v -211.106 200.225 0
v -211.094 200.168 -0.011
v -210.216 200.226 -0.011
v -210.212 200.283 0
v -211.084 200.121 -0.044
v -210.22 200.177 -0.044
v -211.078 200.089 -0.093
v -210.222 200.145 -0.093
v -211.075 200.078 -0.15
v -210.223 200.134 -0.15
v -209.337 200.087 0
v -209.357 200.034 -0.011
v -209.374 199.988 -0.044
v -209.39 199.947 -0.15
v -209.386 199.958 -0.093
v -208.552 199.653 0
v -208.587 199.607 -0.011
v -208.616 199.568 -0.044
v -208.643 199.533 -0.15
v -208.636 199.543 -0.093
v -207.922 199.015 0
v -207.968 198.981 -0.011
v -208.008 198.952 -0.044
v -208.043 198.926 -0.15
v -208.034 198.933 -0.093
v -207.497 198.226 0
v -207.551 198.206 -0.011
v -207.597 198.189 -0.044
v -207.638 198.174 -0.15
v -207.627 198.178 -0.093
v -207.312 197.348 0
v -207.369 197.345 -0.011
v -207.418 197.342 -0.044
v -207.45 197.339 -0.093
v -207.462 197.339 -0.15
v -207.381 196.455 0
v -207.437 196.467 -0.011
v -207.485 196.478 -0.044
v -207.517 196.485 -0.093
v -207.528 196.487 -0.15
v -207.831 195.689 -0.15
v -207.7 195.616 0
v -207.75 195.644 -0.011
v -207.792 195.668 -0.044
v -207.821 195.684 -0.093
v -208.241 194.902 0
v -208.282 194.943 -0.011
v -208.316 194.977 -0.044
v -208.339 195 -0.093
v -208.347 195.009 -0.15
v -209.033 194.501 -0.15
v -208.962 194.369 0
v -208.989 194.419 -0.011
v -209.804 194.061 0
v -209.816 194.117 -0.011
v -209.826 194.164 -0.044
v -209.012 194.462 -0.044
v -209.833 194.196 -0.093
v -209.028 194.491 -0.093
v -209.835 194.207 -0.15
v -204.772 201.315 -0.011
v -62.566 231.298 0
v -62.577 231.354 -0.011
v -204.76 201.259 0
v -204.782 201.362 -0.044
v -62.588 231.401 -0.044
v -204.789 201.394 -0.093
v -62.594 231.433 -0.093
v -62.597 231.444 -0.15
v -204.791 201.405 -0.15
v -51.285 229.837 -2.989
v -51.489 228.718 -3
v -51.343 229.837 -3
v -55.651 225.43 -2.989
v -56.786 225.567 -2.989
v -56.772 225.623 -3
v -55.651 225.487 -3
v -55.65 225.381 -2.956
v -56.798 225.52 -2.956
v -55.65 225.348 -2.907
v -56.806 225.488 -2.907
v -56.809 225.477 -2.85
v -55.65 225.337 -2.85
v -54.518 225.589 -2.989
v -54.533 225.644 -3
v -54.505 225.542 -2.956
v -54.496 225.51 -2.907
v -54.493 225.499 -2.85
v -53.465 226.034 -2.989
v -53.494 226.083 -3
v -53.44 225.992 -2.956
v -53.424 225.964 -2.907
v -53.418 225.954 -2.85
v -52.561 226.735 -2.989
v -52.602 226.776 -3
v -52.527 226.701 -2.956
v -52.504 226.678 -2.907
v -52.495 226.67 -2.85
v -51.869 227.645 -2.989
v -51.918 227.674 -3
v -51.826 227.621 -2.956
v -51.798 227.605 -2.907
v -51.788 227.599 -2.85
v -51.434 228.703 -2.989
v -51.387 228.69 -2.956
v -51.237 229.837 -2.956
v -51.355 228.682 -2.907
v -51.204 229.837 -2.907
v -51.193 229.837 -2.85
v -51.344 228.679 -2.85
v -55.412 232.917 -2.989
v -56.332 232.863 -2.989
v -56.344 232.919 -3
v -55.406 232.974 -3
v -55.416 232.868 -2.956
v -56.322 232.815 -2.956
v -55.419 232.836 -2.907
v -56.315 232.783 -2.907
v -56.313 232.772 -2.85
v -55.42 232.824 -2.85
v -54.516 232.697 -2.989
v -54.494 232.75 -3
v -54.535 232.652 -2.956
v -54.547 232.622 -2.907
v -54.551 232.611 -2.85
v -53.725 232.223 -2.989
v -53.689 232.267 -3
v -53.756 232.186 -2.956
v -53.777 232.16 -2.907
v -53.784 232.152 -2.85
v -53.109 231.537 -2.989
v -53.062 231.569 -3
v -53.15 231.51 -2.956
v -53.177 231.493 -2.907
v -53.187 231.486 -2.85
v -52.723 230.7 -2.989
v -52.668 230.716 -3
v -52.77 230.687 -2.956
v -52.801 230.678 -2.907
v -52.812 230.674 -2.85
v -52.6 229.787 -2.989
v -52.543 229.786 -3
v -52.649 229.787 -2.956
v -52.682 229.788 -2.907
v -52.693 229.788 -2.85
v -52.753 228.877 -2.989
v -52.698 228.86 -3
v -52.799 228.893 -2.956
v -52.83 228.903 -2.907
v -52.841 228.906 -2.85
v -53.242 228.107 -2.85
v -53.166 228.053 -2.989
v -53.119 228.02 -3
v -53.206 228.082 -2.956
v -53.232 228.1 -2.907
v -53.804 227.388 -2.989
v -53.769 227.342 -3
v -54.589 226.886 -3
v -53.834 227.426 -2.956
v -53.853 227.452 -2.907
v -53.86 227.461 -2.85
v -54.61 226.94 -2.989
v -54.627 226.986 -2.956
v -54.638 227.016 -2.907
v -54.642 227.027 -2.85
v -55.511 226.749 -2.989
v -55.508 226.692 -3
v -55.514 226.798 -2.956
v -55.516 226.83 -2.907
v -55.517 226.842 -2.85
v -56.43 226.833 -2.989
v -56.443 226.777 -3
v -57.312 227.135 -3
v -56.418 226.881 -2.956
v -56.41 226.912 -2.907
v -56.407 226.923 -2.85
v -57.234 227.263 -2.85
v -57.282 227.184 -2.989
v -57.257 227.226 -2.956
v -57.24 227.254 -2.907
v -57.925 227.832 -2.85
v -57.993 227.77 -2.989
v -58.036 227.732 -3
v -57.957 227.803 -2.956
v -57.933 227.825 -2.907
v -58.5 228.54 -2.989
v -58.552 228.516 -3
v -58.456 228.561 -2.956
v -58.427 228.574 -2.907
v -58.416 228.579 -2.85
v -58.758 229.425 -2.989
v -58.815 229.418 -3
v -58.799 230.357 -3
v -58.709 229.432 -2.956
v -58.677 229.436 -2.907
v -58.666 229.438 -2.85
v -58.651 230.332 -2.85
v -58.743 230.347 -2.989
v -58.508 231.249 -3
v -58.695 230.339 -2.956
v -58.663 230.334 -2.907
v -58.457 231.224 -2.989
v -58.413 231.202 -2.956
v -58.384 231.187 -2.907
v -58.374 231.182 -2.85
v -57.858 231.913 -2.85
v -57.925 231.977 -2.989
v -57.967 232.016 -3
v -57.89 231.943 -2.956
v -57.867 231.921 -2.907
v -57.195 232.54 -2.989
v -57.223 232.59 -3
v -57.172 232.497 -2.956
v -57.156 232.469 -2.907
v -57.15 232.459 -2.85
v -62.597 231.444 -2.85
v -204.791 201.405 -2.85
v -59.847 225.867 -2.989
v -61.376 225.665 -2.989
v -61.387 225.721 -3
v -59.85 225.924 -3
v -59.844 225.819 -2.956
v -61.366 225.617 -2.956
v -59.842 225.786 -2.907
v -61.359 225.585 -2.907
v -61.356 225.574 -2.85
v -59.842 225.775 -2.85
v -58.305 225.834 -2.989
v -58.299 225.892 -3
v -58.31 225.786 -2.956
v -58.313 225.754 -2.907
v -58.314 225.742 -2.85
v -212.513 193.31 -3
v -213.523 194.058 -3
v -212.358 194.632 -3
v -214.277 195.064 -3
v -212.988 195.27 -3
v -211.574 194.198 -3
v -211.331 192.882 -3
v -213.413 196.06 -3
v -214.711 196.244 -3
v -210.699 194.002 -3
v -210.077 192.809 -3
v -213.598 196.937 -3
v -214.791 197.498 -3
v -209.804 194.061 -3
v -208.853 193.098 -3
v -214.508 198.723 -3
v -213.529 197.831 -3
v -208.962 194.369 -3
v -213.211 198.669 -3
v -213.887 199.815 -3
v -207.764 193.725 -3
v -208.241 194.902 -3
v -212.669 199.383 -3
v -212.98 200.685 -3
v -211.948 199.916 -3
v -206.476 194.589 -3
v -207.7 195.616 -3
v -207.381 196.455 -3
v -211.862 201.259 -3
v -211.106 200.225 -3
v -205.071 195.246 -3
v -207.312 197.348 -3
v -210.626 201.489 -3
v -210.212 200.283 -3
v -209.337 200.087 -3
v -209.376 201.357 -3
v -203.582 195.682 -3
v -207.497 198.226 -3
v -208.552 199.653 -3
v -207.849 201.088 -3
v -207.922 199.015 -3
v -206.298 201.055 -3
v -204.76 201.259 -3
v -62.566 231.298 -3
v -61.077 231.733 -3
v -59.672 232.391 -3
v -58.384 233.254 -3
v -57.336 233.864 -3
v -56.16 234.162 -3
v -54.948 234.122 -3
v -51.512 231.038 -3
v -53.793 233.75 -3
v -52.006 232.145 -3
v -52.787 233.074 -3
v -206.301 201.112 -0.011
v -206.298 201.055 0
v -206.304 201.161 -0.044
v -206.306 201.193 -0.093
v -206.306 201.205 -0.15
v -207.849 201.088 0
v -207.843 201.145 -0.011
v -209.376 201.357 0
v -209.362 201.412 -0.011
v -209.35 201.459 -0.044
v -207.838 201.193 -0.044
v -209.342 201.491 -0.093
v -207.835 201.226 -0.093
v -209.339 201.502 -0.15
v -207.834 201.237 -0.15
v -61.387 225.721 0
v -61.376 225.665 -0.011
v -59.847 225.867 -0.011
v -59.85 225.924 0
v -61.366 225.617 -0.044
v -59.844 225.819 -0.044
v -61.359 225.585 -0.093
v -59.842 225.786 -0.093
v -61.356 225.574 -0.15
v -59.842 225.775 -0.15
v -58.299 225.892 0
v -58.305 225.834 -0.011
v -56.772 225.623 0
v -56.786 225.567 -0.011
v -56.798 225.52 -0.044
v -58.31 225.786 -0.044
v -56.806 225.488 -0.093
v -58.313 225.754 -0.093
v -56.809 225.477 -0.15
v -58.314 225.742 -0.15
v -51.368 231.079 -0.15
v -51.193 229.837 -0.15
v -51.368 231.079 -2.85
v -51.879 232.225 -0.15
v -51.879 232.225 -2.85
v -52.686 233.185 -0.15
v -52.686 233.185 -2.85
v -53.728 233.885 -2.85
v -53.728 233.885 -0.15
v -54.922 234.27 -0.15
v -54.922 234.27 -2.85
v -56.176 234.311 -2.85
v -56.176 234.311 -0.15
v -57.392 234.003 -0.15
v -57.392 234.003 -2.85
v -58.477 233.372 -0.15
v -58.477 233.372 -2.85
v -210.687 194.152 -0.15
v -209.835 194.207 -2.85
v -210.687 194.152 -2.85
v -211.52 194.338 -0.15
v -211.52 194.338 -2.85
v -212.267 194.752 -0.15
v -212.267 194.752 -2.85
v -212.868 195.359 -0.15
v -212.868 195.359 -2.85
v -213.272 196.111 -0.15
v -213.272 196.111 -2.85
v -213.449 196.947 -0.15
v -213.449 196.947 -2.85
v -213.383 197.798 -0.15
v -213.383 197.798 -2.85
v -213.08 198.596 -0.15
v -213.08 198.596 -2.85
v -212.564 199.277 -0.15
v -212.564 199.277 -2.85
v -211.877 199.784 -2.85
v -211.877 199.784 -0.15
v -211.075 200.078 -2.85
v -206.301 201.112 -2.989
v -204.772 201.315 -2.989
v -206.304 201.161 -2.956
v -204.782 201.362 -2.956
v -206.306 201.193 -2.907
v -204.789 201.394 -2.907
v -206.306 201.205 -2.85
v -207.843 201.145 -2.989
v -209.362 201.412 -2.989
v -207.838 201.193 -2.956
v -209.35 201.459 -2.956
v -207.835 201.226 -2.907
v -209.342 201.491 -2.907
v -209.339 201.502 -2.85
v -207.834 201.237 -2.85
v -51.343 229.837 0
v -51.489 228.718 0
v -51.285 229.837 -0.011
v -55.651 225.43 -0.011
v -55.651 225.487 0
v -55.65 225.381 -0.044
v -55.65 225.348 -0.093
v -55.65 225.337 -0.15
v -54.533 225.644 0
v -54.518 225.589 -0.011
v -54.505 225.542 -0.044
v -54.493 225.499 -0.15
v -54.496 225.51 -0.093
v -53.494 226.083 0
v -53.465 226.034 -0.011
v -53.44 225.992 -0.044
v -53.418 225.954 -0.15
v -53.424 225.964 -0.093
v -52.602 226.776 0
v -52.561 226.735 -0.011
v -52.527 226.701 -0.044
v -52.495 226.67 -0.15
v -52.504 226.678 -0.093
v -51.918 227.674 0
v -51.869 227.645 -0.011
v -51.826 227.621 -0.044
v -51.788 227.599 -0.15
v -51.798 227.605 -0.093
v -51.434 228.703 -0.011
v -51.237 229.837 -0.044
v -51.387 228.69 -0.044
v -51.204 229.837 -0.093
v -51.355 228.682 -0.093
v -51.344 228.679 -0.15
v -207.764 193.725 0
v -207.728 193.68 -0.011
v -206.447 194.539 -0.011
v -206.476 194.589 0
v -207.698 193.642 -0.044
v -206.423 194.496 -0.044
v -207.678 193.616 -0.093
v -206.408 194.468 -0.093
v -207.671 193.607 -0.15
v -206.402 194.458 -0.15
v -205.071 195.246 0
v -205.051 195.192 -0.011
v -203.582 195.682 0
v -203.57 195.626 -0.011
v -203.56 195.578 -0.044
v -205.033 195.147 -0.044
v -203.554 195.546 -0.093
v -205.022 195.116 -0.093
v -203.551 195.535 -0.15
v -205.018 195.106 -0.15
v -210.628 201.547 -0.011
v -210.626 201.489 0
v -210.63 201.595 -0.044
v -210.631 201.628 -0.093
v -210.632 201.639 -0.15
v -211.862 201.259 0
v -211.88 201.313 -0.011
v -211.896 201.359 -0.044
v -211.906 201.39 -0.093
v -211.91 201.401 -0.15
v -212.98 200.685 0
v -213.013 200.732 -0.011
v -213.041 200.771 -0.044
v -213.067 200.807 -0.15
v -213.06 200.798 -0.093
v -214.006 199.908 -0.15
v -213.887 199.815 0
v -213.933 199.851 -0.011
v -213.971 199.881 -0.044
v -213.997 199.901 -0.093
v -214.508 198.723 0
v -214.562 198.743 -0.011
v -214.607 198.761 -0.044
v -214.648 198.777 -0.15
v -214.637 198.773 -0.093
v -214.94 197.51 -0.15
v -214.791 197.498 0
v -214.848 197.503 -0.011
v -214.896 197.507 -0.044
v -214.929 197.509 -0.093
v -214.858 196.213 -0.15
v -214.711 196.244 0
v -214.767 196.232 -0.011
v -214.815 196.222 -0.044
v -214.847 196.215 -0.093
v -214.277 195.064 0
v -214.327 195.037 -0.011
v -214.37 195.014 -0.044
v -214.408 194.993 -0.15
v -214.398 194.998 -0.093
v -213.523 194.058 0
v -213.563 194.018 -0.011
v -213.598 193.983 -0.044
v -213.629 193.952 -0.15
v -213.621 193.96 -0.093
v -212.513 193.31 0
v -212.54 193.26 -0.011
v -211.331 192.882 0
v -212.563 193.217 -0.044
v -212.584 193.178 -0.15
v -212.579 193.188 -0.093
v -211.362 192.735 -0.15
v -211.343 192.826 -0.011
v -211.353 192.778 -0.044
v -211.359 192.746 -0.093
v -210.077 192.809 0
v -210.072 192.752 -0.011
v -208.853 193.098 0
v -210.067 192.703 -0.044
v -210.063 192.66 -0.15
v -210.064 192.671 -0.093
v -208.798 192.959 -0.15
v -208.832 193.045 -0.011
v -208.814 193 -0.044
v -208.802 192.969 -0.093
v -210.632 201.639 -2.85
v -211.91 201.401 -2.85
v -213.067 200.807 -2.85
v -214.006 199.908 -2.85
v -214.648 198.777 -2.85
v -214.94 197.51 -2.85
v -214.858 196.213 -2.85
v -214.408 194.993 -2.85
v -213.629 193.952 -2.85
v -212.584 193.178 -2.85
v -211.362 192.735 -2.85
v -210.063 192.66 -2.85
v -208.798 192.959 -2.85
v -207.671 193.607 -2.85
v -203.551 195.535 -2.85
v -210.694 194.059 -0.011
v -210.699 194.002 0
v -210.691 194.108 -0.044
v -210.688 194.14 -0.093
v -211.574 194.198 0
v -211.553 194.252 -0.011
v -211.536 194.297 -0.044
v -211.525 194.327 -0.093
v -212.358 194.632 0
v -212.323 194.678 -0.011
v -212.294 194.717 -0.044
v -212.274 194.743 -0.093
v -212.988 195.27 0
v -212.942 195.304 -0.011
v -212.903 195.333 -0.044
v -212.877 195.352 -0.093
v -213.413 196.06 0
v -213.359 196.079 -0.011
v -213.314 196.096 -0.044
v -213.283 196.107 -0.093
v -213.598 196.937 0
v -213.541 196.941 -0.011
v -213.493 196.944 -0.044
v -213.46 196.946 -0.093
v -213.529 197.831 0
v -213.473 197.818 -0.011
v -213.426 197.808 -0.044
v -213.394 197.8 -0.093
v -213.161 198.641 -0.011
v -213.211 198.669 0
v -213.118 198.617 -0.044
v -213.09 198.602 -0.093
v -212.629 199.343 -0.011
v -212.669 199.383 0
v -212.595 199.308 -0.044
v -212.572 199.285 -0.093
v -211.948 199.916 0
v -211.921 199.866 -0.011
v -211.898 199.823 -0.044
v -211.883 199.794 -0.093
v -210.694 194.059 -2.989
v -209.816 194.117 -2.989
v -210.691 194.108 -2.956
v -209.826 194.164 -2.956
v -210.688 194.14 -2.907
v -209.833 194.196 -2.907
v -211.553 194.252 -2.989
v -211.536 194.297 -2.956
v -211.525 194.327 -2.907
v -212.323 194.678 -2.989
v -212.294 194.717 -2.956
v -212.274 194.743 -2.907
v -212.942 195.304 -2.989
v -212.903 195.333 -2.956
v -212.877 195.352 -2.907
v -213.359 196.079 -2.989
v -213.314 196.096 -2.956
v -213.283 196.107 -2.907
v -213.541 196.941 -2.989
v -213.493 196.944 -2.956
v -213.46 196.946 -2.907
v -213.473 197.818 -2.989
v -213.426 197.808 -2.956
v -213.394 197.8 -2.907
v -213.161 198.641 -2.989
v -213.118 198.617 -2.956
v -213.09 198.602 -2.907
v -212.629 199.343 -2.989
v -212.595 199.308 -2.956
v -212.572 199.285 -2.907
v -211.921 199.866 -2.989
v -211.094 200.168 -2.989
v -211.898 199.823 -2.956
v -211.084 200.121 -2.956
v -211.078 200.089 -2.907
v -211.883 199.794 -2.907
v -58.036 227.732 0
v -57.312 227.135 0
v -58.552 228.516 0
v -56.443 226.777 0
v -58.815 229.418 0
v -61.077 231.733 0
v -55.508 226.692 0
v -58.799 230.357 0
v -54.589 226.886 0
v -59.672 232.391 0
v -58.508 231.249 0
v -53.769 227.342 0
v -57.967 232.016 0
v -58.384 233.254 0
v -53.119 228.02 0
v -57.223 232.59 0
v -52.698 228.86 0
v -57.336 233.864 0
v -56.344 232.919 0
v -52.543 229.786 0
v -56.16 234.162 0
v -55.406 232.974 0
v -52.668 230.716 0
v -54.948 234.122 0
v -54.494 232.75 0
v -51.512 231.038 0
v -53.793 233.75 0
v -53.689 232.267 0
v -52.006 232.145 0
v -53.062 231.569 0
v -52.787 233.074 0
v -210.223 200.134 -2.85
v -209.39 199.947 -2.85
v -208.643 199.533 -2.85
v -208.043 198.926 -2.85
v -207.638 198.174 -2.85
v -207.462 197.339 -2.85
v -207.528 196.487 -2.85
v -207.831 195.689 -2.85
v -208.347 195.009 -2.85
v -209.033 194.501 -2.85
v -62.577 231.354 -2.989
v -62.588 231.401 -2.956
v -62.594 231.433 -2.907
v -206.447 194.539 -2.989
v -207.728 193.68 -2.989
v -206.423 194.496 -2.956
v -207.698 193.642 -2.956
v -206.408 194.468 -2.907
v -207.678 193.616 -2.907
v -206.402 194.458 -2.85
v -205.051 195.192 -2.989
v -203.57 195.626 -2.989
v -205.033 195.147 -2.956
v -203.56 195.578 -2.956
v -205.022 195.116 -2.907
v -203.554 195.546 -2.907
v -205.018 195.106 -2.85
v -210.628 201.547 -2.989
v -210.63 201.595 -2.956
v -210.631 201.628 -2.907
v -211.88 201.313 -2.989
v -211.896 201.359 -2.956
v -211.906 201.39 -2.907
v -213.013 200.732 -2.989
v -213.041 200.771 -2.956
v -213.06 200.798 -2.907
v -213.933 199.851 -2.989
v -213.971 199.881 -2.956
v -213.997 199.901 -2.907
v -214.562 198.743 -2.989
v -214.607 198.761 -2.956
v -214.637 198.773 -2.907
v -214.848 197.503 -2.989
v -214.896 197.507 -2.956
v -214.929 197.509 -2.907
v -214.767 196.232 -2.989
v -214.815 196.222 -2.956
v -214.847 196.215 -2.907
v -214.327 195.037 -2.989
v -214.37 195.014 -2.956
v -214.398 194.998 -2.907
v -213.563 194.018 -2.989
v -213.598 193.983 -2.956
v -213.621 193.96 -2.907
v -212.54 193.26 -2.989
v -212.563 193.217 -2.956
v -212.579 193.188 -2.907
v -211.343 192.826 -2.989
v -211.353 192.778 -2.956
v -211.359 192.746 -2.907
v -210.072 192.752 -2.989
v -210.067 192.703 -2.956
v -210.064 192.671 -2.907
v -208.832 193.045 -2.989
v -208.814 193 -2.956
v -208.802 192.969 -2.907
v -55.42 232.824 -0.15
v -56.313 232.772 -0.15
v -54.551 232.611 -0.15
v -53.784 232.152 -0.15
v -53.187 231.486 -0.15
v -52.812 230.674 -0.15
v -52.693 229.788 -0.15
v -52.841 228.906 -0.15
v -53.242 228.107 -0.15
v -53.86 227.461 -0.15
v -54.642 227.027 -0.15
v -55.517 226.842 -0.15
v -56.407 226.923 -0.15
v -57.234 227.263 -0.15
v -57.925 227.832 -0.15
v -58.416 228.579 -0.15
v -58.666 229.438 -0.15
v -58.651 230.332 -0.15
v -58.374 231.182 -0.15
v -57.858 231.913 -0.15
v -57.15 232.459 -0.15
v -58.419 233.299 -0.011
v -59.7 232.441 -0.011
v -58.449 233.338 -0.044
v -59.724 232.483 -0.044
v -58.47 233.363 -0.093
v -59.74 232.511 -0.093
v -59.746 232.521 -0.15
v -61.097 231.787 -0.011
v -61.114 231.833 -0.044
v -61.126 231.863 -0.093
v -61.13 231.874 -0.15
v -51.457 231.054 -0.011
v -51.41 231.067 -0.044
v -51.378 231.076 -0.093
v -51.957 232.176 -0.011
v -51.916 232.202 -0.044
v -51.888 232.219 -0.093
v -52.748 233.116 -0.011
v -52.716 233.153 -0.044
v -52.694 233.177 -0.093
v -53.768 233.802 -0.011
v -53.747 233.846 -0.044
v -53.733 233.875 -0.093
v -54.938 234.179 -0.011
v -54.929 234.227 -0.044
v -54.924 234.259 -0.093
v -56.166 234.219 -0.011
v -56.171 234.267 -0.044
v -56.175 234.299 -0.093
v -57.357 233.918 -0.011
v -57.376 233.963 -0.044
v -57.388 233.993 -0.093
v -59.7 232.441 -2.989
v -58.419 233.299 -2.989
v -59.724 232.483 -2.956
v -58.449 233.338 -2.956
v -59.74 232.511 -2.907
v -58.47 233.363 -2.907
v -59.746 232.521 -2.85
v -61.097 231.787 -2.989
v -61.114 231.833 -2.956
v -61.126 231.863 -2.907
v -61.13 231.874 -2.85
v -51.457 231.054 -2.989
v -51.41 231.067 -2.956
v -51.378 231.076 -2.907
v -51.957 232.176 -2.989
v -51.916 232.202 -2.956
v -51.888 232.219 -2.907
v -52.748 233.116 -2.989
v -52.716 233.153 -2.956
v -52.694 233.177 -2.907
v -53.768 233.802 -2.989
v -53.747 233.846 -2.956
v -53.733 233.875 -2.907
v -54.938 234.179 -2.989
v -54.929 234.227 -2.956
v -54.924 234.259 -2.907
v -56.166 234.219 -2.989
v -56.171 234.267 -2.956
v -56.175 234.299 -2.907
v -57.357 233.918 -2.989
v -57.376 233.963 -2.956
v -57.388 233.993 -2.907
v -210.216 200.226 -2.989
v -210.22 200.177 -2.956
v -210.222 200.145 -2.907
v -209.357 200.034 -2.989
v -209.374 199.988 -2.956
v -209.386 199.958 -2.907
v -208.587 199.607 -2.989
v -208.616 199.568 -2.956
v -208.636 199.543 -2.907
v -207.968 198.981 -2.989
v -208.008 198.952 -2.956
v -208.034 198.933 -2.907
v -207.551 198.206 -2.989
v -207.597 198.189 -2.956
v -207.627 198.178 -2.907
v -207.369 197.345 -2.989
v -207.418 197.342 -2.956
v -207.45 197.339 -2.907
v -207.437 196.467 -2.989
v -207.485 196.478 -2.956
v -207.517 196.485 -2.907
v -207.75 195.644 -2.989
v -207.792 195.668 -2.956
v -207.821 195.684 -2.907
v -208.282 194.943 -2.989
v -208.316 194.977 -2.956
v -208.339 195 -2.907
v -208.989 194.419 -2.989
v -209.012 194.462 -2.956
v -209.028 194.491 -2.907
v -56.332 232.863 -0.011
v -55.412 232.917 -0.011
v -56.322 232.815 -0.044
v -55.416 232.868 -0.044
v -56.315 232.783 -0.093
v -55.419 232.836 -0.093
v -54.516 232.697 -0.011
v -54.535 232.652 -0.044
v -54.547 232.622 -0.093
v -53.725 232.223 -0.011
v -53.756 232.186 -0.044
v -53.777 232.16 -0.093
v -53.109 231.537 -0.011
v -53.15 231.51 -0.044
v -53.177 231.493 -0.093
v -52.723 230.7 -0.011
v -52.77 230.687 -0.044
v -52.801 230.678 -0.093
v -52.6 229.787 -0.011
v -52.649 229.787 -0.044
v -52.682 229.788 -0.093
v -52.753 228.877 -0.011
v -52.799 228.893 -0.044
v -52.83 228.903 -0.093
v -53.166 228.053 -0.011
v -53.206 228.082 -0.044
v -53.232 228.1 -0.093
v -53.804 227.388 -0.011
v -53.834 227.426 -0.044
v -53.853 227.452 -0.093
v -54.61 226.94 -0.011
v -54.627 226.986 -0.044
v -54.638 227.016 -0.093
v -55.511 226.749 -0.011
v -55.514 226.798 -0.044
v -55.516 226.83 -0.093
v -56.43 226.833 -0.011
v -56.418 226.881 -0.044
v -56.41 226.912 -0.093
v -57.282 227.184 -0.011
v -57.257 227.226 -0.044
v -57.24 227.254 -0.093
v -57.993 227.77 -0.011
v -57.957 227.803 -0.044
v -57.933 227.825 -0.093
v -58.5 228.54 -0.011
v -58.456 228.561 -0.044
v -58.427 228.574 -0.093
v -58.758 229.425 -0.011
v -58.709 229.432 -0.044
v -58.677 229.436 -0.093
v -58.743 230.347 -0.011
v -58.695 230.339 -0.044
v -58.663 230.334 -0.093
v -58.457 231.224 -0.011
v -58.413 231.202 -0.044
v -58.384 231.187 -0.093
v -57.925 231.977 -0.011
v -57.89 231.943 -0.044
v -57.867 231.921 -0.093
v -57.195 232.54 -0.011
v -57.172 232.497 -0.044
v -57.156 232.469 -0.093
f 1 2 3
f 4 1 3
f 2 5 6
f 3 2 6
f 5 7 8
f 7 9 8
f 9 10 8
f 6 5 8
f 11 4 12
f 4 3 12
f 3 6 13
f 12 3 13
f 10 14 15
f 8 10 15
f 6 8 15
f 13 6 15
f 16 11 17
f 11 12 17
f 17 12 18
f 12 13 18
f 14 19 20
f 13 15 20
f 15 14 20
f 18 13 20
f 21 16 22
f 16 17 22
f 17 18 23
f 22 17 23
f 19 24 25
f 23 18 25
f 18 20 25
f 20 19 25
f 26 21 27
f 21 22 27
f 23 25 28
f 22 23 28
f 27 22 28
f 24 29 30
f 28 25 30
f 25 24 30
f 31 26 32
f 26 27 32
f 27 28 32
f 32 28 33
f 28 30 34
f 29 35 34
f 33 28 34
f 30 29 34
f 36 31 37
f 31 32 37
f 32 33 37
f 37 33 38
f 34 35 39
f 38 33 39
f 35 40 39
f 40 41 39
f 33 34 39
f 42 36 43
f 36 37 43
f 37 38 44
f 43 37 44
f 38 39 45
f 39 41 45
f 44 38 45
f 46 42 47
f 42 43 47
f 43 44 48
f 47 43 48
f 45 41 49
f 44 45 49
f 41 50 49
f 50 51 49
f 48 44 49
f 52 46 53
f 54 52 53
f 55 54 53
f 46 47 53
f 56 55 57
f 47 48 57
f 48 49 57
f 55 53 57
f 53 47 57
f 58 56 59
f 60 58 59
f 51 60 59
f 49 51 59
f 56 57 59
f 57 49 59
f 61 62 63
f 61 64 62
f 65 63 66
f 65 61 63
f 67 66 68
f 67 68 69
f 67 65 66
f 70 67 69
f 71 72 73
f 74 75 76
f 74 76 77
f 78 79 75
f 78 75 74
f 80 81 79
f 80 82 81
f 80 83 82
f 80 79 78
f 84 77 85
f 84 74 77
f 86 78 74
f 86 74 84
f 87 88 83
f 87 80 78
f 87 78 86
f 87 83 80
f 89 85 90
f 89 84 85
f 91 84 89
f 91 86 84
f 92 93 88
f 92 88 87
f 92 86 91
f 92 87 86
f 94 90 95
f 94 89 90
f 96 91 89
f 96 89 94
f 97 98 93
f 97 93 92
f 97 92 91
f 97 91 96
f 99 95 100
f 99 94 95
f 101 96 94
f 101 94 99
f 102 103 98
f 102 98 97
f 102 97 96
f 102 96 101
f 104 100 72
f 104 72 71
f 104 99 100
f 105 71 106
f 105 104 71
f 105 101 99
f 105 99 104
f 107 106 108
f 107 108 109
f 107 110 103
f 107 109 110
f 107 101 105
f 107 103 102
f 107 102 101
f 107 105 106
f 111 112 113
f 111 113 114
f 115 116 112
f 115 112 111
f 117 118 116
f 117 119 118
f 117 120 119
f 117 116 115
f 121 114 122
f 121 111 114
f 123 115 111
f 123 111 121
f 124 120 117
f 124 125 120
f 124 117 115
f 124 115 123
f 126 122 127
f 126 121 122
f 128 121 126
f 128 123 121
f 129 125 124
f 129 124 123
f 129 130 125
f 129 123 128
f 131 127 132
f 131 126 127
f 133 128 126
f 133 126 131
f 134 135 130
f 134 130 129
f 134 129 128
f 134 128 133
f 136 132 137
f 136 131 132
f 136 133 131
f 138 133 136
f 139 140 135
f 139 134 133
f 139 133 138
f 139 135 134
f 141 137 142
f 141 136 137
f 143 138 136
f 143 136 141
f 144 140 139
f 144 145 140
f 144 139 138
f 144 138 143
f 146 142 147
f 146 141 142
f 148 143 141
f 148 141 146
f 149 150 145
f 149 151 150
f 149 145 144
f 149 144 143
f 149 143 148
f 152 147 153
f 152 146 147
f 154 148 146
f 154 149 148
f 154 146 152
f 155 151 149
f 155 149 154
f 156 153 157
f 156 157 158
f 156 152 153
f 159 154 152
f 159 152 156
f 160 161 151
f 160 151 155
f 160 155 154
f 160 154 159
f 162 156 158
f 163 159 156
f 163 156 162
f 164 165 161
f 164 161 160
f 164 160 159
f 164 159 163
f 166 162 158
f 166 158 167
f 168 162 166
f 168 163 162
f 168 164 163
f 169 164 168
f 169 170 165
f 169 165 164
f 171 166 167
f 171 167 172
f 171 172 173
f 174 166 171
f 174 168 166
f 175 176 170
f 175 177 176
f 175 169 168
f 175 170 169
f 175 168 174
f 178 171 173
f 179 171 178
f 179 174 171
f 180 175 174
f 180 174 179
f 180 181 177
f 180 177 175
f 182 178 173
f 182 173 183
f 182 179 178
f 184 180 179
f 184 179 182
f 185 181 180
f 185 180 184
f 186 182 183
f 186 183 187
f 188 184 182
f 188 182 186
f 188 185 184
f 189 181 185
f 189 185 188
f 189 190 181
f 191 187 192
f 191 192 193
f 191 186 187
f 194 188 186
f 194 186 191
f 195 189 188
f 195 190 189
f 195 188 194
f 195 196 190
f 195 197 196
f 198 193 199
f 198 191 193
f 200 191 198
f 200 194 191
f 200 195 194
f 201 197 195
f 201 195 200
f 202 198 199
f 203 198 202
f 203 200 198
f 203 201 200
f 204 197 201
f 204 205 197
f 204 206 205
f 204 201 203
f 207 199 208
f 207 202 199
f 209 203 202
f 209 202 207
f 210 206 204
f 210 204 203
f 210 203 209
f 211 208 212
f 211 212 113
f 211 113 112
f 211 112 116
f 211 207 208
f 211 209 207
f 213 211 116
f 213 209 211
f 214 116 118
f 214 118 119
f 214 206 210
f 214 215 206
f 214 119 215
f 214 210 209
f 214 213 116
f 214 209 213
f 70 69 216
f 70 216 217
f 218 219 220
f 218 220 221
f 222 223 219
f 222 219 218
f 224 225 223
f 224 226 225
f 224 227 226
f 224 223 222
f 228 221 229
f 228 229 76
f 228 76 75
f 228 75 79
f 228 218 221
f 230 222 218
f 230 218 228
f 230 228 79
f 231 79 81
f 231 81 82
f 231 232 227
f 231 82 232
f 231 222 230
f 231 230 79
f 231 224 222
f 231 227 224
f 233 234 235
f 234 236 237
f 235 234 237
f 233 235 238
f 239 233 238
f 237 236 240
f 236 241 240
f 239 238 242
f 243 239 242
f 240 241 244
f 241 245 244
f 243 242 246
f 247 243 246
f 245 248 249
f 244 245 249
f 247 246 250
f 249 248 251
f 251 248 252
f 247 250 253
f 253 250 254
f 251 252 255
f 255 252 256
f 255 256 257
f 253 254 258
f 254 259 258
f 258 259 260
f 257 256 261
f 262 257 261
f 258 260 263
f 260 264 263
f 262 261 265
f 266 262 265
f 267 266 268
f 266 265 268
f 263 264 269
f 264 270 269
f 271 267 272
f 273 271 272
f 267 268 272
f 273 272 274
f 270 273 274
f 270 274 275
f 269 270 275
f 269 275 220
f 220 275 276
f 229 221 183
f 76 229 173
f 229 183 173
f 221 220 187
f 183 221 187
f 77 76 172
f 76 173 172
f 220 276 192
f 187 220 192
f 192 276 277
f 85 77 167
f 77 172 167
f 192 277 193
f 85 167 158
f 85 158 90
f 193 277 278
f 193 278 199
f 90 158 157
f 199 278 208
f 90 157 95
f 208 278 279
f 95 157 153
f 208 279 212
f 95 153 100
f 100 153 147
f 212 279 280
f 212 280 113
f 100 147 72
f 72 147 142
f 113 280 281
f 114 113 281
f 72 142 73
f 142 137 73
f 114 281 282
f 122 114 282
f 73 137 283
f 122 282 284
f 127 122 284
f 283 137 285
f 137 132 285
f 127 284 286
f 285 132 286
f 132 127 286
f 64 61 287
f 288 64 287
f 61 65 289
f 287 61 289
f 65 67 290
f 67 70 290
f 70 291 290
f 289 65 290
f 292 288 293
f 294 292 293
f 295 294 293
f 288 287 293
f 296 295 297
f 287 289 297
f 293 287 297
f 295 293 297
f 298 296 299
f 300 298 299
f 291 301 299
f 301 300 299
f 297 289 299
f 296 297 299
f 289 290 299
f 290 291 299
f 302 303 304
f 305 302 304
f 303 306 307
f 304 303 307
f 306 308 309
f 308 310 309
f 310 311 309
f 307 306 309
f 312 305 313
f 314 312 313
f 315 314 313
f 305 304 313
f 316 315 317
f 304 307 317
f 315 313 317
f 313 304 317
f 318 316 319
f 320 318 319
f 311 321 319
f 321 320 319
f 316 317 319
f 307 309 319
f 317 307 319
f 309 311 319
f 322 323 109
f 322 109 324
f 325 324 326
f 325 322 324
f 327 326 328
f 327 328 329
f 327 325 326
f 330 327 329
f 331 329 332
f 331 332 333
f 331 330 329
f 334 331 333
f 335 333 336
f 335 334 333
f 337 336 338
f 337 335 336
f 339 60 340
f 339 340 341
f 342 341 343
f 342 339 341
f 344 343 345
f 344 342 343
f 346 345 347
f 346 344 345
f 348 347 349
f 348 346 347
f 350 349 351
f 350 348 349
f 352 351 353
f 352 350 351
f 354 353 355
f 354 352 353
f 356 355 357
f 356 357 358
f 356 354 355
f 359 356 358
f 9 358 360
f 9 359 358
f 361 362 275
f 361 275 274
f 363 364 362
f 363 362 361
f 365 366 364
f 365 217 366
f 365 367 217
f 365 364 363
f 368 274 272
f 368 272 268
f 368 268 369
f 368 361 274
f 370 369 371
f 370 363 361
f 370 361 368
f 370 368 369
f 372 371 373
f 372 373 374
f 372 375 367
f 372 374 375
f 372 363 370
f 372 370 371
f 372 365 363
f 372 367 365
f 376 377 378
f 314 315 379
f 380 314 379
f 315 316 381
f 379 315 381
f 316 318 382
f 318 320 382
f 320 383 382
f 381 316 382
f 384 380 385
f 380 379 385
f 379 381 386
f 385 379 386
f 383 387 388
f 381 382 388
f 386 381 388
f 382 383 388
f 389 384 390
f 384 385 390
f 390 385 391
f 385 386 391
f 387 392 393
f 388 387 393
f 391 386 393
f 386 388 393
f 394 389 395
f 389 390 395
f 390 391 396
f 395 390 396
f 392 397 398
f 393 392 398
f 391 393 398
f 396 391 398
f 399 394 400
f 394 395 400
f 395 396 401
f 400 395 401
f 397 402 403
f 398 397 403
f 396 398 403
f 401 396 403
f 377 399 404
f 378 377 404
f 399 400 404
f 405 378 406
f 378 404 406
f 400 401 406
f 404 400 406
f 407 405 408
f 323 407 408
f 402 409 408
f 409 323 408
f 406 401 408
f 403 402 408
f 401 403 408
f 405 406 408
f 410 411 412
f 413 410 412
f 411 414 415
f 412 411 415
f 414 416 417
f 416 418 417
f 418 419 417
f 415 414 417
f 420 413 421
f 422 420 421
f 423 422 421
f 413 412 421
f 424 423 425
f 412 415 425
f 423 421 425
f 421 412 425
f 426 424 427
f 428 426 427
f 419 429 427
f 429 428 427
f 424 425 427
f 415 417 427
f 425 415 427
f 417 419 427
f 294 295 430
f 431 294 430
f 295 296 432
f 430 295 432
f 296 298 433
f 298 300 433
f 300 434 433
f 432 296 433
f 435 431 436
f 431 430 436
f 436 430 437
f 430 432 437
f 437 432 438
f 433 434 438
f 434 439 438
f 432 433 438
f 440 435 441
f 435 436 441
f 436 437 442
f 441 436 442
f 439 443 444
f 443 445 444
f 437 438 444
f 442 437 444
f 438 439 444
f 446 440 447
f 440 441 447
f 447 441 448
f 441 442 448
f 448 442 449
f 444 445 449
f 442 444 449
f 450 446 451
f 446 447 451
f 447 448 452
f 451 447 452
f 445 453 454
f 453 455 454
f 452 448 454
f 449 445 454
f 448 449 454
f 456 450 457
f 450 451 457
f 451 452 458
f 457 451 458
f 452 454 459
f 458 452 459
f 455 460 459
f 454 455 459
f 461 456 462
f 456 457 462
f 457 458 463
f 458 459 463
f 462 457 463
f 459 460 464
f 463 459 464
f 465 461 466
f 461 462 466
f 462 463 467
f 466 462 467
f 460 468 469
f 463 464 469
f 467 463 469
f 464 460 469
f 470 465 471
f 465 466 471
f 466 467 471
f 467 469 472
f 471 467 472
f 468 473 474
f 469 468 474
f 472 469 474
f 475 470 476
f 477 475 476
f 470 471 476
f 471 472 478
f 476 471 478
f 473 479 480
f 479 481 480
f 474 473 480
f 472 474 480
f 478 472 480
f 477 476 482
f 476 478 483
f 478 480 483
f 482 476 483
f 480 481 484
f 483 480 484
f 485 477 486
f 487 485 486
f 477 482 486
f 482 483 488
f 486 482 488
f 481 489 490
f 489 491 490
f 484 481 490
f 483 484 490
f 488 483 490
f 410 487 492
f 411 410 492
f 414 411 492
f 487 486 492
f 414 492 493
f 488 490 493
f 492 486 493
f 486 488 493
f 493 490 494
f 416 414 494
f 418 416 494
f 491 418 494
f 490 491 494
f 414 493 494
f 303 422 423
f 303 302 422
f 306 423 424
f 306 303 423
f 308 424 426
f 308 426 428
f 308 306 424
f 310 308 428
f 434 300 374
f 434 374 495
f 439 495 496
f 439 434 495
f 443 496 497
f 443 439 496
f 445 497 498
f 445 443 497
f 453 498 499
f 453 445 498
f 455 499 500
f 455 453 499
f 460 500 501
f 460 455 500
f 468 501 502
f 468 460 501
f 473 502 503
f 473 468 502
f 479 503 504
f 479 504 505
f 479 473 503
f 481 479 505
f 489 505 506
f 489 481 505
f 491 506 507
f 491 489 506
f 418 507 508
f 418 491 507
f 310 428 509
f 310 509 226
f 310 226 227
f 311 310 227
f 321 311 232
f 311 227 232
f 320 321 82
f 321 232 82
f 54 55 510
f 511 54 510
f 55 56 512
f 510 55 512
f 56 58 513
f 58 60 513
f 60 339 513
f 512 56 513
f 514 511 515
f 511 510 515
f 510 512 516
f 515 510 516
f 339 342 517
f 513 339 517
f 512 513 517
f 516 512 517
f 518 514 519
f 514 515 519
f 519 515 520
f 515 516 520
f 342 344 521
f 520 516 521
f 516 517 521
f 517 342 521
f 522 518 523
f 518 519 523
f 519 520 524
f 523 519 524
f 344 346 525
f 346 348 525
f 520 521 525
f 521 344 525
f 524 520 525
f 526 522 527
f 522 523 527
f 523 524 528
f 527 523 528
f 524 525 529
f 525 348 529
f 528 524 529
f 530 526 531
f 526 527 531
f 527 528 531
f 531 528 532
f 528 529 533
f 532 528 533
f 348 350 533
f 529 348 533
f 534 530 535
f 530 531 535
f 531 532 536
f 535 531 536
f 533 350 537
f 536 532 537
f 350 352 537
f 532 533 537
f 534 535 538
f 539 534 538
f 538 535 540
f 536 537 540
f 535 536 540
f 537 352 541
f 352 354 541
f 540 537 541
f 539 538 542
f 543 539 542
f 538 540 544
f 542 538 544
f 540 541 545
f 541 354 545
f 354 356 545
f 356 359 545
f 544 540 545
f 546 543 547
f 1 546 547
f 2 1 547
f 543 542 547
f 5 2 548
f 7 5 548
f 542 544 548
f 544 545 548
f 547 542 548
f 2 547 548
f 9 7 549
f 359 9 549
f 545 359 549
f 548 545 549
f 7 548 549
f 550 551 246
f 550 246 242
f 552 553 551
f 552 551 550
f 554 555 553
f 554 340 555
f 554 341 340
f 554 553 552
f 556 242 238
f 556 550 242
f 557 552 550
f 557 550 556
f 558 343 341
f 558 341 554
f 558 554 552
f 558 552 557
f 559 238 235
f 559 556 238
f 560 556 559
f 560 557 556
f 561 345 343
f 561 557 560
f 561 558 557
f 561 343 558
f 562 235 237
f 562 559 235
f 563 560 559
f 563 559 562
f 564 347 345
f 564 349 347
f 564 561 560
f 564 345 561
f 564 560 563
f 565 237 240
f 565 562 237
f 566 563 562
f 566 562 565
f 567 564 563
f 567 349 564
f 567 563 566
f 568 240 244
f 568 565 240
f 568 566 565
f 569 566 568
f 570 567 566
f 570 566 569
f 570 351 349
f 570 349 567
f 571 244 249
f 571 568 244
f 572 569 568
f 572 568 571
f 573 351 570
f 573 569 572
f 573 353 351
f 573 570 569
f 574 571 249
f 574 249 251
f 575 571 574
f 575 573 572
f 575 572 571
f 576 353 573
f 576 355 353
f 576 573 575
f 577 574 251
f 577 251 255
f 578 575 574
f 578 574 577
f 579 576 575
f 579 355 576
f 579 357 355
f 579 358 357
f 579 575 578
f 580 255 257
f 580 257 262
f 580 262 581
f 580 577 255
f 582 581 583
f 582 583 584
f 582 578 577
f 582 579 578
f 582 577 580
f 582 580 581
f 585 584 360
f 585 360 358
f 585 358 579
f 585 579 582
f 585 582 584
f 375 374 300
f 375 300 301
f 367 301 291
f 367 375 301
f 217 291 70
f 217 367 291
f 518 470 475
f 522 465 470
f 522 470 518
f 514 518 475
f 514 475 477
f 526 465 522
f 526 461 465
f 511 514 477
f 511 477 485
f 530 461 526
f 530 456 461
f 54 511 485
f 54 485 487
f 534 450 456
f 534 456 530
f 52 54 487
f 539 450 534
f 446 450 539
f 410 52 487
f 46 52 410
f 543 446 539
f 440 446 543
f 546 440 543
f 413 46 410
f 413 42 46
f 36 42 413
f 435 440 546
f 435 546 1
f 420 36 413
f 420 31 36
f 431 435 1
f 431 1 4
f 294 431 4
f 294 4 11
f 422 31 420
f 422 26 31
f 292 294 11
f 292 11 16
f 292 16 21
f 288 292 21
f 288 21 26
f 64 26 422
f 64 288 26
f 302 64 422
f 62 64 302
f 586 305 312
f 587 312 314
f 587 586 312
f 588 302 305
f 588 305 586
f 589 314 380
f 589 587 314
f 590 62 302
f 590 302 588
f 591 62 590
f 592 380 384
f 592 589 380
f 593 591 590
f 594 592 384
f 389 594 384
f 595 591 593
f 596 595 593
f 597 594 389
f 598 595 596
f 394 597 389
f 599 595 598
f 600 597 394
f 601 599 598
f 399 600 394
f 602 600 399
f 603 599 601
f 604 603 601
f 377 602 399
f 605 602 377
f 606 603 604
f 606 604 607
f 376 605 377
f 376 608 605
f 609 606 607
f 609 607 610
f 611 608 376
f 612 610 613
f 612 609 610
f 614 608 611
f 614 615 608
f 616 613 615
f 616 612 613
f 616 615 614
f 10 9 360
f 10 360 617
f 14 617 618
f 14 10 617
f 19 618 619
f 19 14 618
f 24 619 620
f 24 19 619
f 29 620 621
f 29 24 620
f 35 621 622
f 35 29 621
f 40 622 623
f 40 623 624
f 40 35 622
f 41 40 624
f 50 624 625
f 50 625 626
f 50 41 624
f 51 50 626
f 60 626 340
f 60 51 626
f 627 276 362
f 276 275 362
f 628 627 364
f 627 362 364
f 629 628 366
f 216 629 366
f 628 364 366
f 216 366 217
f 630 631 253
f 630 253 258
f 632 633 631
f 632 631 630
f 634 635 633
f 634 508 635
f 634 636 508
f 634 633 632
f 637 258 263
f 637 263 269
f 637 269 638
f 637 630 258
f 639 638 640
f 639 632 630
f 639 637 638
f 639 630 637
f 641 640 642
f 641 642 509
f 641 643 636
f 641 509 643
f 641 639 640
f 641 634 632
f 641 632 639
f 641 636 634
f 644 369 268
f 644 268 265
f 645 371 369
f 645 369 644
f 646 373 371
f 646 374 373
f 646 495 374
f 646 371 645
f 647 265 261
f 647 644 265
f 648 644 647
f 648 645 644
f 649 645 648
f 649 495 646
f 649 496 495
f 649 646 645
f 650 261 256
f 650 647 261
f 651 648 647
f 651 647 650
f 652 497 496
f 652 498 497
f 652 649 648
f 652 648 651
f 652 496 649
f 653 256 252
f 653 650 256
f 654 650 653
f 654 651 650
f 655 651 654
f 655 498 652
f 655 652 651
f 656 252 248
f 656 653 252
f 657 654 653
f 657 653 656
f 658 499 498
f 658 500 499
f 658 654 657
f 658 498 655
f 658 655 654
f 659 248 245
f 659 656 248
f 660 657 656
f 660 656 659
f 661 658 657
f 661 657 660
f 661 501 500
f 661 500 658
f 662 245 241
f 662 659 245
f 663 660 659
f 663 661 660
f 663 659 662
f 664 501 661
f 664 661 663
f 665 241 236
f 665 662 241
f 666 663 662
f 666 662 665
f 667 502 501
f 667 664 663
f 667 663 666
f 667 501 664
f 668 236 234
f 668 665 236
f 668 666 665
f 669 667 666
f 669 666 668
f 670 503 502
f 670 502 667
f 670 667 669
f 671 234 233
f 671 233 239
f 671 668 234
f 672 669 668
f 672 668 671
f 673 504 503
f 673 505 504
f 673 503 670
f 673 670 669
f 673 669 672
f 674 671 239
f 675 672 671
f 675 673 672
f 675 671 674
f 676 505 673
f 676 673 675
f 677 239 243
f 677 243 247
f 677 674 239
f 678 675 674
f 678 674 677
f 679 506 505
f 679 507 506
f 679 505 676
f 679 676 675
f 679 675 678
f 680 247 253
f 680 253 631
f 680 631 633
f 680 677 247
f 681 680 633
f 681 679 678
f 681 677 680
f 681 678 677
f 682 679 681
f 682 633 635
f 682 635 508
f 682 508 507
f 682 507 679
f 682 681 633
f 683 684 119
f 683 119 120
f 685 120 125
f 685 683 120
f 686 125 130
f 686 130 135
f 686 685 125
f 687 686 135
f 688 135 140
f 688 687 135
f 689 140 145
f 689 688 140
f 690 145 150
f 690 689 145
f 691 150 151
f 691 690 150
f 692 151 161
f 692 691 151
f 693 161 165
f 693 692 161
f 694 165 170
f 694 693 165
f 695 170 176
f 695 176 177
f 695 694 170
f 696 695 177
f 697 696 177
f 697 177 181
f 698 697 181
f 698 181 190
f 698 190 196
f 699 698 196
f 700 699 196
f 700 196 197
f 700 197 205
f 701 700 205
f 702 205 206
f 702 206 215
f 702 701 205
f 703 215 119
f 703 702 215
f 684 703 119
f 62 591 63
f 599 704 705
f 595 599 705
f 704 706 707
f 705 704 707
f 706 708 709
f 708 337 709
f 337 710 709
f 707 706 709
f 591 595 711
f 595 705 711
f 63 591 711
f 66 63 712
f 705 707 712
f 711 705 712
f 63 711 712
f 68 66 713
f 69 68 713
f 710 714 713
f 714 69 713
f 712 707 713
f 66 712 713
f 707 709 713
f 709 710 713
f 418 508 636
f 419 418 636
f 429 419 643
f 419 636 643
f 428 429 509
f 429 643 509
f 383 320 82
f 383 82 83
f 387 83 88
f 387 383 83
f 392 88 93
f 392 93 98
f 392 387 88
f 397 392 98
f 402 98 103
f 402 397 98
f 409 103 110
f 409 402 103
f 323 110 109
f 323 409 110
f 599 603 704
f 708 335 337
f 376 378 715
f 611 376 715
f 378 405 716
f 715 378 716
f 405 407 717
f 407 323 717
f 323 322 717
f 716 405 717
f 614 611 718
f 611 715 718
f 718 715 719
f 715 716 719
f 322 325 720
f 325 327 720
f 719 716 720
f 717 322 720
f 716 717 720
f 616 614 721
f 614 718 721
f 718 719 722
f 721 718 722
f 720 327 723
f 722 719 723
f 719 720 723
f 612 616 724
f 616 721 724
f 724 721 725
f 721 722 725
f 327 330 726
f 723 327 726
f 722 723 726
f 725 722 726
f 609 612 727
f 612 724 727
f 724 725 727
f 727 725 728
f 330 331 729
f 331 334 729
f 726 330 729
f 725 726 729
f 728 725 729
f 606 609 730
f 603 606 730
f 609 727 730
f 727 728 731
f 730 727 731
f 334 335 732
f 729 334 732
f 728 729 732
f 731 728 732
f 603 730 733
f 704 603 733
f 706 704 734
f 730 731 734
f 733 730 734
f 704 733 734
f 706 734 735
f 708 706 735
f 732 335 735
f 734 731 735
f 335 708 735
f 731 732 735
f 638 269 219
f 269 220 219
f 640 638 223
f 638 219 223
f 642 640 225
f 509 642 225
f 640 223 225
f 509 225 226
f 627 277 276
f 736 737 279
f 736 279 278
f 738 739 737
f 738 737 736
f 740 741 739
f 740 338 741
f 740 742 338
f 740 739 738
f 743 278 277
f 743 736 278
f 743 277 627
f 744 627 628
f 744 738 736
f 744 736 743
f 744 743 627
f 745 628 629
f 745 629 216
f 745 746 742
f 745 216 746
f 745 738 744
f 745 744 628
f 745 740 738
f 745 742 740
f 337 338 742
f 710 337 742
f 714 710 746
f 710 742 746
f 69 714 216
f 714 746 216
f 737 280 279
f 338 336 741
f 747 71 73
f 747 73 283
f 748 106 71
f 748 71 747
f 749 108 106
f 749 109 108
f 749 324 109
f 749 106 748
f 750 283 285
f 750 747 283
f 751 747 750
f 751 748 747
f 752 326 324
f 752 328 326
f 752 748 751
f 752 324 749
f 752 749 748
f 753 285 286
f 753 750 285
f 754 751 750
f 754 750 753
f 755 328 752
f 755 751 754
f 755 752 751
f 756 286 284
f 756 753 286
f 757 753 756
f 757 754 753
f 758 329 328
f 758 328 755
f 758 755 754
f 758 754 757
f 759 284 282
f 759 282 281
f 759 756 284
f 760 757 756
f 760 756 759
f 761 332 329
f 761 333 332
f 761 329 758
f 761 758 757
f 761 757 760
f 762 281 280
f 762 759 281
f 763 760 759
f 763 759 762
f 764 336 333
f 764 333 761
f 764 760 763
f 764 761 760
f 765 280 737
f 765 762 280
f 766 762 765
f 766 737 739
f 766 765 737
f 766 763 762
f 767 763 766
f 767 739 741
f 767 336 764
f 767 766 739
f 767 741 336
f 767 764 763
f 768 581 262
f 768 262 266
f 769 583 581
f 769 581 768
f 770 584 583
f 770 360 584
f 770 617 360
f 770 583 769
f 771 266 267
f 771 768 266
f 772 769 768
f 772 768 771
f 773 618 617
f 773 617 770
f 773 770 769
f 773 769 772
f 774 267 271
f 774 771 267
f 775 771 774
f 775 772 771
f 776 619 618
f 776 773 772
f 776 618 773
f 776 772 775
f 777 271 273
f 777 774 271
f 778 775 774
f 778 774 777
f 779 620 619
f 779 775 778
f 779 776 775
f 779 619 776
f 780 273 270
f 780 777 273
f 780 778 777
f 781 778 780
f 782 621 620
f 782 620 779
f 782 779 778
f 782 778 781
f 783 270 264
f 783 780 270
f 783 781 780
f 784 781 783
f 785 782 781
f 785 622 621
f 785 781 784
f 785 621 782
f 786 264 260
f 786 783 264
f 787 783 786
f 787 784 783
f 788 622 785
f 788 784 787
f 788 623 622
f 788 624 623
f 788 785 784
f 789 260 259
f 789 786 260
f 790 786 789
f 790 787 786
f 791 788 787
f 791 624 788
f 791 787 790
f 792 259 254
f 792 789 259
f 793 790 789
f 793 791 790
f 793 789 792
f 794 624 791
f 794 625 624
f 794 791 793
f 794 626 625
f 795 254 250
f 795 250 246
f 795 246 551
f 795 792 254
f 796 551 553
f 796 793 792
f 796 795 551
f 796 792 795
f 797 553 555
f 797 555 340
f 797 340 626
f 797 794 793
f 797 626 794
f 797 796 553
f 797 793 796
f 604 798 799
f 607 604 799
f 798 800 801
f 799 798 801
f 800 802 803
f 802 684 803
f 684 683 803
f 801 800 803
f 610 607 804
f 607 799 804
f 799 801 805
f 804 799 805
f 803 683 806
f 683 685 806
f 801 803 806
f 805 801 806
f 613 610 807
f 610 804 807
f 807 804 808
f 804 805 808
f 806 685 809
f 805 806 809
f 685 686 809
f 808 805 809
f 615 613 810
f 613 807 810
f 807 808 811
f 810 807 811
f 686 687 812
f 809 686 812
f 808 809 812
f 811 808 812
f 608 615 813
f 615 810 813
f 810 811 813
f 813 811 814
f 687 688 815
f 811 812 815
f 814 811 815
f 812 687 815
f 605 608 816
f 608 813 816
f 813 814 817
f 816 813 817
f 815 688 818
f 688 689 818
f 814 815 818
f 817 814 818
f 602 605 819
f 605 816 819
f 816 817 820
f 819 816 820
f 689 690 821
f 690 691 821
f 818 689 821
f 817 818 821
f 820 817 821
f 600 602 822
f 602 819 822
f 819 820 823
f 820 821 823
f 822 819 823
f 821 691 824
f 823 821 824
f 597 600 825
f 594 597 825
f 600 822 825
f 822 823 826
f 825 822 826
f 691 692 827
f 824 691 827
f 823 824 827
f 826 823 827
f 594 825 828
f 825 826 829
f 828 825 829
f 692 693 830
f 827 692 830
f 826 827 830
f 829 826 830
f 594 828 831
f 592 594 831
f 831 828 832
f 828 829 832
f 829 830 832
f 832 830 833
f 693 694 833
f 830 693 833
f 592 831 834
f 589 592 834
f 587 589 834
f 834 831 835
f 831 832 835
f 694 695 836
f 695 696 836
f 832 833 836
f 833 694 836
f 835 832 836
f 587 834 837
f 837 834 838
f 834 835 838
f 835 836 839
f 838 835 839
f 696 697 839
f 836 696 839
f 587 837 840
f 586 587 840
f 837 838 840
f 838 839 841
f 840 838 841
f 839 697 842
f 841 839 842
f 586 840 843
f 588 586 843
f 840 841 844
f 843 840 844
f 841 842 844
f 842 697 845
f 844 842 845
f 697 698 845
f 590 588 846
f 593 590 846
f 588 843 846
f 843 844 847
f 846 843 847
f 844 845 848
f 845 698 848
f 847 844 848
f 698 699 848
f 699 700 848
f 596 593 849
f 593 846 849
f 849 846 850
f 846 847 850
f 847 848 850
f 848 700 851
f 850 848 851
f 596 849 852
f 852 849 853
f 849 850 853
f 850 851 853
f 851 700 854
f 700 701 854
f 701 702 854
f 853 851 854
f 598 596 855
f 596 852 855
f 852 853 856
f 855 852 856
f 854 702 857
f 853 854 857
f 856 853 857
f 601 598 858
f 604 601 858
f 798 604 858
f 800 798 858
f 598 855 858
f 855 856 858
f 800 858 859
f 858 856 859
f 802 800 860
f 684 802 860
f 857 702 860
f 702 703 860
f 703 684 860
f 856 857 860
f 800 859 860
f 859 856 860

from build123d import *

# Parameters (mm, degrees)
BOSS_EXTRUDE1_DEPTH = 3
FILLET1_R           = 10
FILLET2_R           = 0.15


with BuildPart() as part:
    # Sketch1 → Boss-Extrude1 (new body)
    with BuildSketch(Plane.XY):
        with BuildLine():
            ThreePointArc((-209.835147147, 194.207413795), (-213.390440211, 196.522557684), (-211.075296322, 200.077850749))
            Line((-211.075296322, 200.077850749), (-207.793622301, 200.771115213))
            ThreePointArc((-207.793622301, 200.771115213), (-214.85804945, 196.212520391), (-206.553473126, 194.90067826))
            Line((-206.553473126, 194.90067826), (-209.835147147, 194.207413795))
        make_face()
        with BuildLine():
            Line((-207.793622301, 200.771115213), (-211.075296322, 200.077850749))
            ThreePointArc((-211.075296322, 200.077850749), (-207.520003258, 197.762706859), (-209.835147147, 194.207413795))
            Line((-209.835147147, 194.207413795), (-206.553473126, 194.90067826))
            ThreePointArc((-206.553473126, 194.90067826), (-206.107356239, 195.982431587), (-205.955221735, 197.142632272))
            ThreePointArc((-205.955221735, 197.142632272), (-206.441047009, 199.176446736), (-207.793622301, 200.771115213))
        make_face()
        with BuildLine():
            Line((-59.594334041, 232.07870382), (-207.793622301, 200.771115213))
            ThreePointArc((-207.793622301, 200.771115213), (-206.441047009, 199.176446736), (-205.955221735, 197.142632272))
            ThreePointArc((-205.955221735, 197.142632272), (-206.107356239, 195.982431587), (-206.553473126, 194.90067826))
            Line((-206.553473126, 194.90067826), (-58.354184866, 226.208266866))
            ThreePointArc((-58.354184866, 226.208266866), (-60.095413147, 228.906637926), (-59.594334041, 232.07870382))
        make_face()
        with BuildLine():
            ThreePointArc((-51.192585432, 229.836749808), (-54.532384747, 234.184615303), (-59.594334041, 232.07870382))
            Line((-59.594334041, 232.07870382), (-56.31266002, 232.771968284))
            ThreePointArc((-56.31266002, 232.771968284), (-52.757366956, 230.456824395), (-55.072510845, 226.901531331))
            Line((-55.072510845, 226.901531331), (-58.354184866, 226.208266866))
            ThreePointArc((-58.354184866, 226.208266866), (-53.658770968, 225.822575082), (-51.192585432, 229.836749808))
        make_face()
        with BuildLine():
            Line((-56.31266002, 232.771968284), (-59.594334041, 232.07870382))
            ThreePointArc((-59.594334041, 232.07870382), (-60.095413147, 228.906637926), (-58.354184866, 226.208266866))
            Line((-58.354184866, 226.208266866), (-55.072510845, 226.901531331))
            ThreePointArc((-55.072510845, 226.901531331), (-58.627803909, 229.21667522), (-56.31266002, 232.771968284))
        make_face()
    extrude(amount=-BOSS_EXTRUDE1_DEPTH)

    # Fillet1
    fillet1_edges = [part.edges().sort_by_distance(p)[0] for p in [
        (-207.793622301, 200.771115213, -1.5),
        (-59.594334041, 232.07870382, -1.5),
        (-58.354184866, 226.208266866, -1.5),
        (-206.553473126, 194.90067826, -1.5),
    ]]
    fillet(fillet1_edges, radius=FILLET1_R)

    # Fillet2
    fillet2_edges = [part.edges().sort_by_distance(p)[0] for p in [
        (-56.31266002, 232.771968284, 0),
        (-51.289757717, 230.766861689, 0),
        (-51.289757717, 230.766861689, -3),
        (-133.693978171, 216.424909516, 0),
        (-133.693978171, 216.424909516, -3),
        (-132.453828996, 210.554472563, 0),
        (-132.453828996, 210.554472563, -3),
        (-209.835147147, 194.207413795, -3),
        (-214.85804945, 196.212520391, 0),
        (-214.85804945, 196.212520391, -3),
        (-60.425568376, 232.170940787, 0),
        (-60.425568376, 232.170940787, -3),
        (-59.077090387, 225.787712727, 0),
        (-59.077090387, 225.787712727, -3),
        (-205.722238791, 194.808441292, 0),
        (-205.722238791, 194.808441292, -3),
        (-207.07071678, 201.191669353, 0),
        (-207.07071678, 201.191669353, -3),
        (-56.31266002, 232.771968284, -3),
        (-209.835147147, 194.207413795, 0),
    ]]
    fillet(fillet2_edges, radius=FILLET2_R)


solid = part.part
